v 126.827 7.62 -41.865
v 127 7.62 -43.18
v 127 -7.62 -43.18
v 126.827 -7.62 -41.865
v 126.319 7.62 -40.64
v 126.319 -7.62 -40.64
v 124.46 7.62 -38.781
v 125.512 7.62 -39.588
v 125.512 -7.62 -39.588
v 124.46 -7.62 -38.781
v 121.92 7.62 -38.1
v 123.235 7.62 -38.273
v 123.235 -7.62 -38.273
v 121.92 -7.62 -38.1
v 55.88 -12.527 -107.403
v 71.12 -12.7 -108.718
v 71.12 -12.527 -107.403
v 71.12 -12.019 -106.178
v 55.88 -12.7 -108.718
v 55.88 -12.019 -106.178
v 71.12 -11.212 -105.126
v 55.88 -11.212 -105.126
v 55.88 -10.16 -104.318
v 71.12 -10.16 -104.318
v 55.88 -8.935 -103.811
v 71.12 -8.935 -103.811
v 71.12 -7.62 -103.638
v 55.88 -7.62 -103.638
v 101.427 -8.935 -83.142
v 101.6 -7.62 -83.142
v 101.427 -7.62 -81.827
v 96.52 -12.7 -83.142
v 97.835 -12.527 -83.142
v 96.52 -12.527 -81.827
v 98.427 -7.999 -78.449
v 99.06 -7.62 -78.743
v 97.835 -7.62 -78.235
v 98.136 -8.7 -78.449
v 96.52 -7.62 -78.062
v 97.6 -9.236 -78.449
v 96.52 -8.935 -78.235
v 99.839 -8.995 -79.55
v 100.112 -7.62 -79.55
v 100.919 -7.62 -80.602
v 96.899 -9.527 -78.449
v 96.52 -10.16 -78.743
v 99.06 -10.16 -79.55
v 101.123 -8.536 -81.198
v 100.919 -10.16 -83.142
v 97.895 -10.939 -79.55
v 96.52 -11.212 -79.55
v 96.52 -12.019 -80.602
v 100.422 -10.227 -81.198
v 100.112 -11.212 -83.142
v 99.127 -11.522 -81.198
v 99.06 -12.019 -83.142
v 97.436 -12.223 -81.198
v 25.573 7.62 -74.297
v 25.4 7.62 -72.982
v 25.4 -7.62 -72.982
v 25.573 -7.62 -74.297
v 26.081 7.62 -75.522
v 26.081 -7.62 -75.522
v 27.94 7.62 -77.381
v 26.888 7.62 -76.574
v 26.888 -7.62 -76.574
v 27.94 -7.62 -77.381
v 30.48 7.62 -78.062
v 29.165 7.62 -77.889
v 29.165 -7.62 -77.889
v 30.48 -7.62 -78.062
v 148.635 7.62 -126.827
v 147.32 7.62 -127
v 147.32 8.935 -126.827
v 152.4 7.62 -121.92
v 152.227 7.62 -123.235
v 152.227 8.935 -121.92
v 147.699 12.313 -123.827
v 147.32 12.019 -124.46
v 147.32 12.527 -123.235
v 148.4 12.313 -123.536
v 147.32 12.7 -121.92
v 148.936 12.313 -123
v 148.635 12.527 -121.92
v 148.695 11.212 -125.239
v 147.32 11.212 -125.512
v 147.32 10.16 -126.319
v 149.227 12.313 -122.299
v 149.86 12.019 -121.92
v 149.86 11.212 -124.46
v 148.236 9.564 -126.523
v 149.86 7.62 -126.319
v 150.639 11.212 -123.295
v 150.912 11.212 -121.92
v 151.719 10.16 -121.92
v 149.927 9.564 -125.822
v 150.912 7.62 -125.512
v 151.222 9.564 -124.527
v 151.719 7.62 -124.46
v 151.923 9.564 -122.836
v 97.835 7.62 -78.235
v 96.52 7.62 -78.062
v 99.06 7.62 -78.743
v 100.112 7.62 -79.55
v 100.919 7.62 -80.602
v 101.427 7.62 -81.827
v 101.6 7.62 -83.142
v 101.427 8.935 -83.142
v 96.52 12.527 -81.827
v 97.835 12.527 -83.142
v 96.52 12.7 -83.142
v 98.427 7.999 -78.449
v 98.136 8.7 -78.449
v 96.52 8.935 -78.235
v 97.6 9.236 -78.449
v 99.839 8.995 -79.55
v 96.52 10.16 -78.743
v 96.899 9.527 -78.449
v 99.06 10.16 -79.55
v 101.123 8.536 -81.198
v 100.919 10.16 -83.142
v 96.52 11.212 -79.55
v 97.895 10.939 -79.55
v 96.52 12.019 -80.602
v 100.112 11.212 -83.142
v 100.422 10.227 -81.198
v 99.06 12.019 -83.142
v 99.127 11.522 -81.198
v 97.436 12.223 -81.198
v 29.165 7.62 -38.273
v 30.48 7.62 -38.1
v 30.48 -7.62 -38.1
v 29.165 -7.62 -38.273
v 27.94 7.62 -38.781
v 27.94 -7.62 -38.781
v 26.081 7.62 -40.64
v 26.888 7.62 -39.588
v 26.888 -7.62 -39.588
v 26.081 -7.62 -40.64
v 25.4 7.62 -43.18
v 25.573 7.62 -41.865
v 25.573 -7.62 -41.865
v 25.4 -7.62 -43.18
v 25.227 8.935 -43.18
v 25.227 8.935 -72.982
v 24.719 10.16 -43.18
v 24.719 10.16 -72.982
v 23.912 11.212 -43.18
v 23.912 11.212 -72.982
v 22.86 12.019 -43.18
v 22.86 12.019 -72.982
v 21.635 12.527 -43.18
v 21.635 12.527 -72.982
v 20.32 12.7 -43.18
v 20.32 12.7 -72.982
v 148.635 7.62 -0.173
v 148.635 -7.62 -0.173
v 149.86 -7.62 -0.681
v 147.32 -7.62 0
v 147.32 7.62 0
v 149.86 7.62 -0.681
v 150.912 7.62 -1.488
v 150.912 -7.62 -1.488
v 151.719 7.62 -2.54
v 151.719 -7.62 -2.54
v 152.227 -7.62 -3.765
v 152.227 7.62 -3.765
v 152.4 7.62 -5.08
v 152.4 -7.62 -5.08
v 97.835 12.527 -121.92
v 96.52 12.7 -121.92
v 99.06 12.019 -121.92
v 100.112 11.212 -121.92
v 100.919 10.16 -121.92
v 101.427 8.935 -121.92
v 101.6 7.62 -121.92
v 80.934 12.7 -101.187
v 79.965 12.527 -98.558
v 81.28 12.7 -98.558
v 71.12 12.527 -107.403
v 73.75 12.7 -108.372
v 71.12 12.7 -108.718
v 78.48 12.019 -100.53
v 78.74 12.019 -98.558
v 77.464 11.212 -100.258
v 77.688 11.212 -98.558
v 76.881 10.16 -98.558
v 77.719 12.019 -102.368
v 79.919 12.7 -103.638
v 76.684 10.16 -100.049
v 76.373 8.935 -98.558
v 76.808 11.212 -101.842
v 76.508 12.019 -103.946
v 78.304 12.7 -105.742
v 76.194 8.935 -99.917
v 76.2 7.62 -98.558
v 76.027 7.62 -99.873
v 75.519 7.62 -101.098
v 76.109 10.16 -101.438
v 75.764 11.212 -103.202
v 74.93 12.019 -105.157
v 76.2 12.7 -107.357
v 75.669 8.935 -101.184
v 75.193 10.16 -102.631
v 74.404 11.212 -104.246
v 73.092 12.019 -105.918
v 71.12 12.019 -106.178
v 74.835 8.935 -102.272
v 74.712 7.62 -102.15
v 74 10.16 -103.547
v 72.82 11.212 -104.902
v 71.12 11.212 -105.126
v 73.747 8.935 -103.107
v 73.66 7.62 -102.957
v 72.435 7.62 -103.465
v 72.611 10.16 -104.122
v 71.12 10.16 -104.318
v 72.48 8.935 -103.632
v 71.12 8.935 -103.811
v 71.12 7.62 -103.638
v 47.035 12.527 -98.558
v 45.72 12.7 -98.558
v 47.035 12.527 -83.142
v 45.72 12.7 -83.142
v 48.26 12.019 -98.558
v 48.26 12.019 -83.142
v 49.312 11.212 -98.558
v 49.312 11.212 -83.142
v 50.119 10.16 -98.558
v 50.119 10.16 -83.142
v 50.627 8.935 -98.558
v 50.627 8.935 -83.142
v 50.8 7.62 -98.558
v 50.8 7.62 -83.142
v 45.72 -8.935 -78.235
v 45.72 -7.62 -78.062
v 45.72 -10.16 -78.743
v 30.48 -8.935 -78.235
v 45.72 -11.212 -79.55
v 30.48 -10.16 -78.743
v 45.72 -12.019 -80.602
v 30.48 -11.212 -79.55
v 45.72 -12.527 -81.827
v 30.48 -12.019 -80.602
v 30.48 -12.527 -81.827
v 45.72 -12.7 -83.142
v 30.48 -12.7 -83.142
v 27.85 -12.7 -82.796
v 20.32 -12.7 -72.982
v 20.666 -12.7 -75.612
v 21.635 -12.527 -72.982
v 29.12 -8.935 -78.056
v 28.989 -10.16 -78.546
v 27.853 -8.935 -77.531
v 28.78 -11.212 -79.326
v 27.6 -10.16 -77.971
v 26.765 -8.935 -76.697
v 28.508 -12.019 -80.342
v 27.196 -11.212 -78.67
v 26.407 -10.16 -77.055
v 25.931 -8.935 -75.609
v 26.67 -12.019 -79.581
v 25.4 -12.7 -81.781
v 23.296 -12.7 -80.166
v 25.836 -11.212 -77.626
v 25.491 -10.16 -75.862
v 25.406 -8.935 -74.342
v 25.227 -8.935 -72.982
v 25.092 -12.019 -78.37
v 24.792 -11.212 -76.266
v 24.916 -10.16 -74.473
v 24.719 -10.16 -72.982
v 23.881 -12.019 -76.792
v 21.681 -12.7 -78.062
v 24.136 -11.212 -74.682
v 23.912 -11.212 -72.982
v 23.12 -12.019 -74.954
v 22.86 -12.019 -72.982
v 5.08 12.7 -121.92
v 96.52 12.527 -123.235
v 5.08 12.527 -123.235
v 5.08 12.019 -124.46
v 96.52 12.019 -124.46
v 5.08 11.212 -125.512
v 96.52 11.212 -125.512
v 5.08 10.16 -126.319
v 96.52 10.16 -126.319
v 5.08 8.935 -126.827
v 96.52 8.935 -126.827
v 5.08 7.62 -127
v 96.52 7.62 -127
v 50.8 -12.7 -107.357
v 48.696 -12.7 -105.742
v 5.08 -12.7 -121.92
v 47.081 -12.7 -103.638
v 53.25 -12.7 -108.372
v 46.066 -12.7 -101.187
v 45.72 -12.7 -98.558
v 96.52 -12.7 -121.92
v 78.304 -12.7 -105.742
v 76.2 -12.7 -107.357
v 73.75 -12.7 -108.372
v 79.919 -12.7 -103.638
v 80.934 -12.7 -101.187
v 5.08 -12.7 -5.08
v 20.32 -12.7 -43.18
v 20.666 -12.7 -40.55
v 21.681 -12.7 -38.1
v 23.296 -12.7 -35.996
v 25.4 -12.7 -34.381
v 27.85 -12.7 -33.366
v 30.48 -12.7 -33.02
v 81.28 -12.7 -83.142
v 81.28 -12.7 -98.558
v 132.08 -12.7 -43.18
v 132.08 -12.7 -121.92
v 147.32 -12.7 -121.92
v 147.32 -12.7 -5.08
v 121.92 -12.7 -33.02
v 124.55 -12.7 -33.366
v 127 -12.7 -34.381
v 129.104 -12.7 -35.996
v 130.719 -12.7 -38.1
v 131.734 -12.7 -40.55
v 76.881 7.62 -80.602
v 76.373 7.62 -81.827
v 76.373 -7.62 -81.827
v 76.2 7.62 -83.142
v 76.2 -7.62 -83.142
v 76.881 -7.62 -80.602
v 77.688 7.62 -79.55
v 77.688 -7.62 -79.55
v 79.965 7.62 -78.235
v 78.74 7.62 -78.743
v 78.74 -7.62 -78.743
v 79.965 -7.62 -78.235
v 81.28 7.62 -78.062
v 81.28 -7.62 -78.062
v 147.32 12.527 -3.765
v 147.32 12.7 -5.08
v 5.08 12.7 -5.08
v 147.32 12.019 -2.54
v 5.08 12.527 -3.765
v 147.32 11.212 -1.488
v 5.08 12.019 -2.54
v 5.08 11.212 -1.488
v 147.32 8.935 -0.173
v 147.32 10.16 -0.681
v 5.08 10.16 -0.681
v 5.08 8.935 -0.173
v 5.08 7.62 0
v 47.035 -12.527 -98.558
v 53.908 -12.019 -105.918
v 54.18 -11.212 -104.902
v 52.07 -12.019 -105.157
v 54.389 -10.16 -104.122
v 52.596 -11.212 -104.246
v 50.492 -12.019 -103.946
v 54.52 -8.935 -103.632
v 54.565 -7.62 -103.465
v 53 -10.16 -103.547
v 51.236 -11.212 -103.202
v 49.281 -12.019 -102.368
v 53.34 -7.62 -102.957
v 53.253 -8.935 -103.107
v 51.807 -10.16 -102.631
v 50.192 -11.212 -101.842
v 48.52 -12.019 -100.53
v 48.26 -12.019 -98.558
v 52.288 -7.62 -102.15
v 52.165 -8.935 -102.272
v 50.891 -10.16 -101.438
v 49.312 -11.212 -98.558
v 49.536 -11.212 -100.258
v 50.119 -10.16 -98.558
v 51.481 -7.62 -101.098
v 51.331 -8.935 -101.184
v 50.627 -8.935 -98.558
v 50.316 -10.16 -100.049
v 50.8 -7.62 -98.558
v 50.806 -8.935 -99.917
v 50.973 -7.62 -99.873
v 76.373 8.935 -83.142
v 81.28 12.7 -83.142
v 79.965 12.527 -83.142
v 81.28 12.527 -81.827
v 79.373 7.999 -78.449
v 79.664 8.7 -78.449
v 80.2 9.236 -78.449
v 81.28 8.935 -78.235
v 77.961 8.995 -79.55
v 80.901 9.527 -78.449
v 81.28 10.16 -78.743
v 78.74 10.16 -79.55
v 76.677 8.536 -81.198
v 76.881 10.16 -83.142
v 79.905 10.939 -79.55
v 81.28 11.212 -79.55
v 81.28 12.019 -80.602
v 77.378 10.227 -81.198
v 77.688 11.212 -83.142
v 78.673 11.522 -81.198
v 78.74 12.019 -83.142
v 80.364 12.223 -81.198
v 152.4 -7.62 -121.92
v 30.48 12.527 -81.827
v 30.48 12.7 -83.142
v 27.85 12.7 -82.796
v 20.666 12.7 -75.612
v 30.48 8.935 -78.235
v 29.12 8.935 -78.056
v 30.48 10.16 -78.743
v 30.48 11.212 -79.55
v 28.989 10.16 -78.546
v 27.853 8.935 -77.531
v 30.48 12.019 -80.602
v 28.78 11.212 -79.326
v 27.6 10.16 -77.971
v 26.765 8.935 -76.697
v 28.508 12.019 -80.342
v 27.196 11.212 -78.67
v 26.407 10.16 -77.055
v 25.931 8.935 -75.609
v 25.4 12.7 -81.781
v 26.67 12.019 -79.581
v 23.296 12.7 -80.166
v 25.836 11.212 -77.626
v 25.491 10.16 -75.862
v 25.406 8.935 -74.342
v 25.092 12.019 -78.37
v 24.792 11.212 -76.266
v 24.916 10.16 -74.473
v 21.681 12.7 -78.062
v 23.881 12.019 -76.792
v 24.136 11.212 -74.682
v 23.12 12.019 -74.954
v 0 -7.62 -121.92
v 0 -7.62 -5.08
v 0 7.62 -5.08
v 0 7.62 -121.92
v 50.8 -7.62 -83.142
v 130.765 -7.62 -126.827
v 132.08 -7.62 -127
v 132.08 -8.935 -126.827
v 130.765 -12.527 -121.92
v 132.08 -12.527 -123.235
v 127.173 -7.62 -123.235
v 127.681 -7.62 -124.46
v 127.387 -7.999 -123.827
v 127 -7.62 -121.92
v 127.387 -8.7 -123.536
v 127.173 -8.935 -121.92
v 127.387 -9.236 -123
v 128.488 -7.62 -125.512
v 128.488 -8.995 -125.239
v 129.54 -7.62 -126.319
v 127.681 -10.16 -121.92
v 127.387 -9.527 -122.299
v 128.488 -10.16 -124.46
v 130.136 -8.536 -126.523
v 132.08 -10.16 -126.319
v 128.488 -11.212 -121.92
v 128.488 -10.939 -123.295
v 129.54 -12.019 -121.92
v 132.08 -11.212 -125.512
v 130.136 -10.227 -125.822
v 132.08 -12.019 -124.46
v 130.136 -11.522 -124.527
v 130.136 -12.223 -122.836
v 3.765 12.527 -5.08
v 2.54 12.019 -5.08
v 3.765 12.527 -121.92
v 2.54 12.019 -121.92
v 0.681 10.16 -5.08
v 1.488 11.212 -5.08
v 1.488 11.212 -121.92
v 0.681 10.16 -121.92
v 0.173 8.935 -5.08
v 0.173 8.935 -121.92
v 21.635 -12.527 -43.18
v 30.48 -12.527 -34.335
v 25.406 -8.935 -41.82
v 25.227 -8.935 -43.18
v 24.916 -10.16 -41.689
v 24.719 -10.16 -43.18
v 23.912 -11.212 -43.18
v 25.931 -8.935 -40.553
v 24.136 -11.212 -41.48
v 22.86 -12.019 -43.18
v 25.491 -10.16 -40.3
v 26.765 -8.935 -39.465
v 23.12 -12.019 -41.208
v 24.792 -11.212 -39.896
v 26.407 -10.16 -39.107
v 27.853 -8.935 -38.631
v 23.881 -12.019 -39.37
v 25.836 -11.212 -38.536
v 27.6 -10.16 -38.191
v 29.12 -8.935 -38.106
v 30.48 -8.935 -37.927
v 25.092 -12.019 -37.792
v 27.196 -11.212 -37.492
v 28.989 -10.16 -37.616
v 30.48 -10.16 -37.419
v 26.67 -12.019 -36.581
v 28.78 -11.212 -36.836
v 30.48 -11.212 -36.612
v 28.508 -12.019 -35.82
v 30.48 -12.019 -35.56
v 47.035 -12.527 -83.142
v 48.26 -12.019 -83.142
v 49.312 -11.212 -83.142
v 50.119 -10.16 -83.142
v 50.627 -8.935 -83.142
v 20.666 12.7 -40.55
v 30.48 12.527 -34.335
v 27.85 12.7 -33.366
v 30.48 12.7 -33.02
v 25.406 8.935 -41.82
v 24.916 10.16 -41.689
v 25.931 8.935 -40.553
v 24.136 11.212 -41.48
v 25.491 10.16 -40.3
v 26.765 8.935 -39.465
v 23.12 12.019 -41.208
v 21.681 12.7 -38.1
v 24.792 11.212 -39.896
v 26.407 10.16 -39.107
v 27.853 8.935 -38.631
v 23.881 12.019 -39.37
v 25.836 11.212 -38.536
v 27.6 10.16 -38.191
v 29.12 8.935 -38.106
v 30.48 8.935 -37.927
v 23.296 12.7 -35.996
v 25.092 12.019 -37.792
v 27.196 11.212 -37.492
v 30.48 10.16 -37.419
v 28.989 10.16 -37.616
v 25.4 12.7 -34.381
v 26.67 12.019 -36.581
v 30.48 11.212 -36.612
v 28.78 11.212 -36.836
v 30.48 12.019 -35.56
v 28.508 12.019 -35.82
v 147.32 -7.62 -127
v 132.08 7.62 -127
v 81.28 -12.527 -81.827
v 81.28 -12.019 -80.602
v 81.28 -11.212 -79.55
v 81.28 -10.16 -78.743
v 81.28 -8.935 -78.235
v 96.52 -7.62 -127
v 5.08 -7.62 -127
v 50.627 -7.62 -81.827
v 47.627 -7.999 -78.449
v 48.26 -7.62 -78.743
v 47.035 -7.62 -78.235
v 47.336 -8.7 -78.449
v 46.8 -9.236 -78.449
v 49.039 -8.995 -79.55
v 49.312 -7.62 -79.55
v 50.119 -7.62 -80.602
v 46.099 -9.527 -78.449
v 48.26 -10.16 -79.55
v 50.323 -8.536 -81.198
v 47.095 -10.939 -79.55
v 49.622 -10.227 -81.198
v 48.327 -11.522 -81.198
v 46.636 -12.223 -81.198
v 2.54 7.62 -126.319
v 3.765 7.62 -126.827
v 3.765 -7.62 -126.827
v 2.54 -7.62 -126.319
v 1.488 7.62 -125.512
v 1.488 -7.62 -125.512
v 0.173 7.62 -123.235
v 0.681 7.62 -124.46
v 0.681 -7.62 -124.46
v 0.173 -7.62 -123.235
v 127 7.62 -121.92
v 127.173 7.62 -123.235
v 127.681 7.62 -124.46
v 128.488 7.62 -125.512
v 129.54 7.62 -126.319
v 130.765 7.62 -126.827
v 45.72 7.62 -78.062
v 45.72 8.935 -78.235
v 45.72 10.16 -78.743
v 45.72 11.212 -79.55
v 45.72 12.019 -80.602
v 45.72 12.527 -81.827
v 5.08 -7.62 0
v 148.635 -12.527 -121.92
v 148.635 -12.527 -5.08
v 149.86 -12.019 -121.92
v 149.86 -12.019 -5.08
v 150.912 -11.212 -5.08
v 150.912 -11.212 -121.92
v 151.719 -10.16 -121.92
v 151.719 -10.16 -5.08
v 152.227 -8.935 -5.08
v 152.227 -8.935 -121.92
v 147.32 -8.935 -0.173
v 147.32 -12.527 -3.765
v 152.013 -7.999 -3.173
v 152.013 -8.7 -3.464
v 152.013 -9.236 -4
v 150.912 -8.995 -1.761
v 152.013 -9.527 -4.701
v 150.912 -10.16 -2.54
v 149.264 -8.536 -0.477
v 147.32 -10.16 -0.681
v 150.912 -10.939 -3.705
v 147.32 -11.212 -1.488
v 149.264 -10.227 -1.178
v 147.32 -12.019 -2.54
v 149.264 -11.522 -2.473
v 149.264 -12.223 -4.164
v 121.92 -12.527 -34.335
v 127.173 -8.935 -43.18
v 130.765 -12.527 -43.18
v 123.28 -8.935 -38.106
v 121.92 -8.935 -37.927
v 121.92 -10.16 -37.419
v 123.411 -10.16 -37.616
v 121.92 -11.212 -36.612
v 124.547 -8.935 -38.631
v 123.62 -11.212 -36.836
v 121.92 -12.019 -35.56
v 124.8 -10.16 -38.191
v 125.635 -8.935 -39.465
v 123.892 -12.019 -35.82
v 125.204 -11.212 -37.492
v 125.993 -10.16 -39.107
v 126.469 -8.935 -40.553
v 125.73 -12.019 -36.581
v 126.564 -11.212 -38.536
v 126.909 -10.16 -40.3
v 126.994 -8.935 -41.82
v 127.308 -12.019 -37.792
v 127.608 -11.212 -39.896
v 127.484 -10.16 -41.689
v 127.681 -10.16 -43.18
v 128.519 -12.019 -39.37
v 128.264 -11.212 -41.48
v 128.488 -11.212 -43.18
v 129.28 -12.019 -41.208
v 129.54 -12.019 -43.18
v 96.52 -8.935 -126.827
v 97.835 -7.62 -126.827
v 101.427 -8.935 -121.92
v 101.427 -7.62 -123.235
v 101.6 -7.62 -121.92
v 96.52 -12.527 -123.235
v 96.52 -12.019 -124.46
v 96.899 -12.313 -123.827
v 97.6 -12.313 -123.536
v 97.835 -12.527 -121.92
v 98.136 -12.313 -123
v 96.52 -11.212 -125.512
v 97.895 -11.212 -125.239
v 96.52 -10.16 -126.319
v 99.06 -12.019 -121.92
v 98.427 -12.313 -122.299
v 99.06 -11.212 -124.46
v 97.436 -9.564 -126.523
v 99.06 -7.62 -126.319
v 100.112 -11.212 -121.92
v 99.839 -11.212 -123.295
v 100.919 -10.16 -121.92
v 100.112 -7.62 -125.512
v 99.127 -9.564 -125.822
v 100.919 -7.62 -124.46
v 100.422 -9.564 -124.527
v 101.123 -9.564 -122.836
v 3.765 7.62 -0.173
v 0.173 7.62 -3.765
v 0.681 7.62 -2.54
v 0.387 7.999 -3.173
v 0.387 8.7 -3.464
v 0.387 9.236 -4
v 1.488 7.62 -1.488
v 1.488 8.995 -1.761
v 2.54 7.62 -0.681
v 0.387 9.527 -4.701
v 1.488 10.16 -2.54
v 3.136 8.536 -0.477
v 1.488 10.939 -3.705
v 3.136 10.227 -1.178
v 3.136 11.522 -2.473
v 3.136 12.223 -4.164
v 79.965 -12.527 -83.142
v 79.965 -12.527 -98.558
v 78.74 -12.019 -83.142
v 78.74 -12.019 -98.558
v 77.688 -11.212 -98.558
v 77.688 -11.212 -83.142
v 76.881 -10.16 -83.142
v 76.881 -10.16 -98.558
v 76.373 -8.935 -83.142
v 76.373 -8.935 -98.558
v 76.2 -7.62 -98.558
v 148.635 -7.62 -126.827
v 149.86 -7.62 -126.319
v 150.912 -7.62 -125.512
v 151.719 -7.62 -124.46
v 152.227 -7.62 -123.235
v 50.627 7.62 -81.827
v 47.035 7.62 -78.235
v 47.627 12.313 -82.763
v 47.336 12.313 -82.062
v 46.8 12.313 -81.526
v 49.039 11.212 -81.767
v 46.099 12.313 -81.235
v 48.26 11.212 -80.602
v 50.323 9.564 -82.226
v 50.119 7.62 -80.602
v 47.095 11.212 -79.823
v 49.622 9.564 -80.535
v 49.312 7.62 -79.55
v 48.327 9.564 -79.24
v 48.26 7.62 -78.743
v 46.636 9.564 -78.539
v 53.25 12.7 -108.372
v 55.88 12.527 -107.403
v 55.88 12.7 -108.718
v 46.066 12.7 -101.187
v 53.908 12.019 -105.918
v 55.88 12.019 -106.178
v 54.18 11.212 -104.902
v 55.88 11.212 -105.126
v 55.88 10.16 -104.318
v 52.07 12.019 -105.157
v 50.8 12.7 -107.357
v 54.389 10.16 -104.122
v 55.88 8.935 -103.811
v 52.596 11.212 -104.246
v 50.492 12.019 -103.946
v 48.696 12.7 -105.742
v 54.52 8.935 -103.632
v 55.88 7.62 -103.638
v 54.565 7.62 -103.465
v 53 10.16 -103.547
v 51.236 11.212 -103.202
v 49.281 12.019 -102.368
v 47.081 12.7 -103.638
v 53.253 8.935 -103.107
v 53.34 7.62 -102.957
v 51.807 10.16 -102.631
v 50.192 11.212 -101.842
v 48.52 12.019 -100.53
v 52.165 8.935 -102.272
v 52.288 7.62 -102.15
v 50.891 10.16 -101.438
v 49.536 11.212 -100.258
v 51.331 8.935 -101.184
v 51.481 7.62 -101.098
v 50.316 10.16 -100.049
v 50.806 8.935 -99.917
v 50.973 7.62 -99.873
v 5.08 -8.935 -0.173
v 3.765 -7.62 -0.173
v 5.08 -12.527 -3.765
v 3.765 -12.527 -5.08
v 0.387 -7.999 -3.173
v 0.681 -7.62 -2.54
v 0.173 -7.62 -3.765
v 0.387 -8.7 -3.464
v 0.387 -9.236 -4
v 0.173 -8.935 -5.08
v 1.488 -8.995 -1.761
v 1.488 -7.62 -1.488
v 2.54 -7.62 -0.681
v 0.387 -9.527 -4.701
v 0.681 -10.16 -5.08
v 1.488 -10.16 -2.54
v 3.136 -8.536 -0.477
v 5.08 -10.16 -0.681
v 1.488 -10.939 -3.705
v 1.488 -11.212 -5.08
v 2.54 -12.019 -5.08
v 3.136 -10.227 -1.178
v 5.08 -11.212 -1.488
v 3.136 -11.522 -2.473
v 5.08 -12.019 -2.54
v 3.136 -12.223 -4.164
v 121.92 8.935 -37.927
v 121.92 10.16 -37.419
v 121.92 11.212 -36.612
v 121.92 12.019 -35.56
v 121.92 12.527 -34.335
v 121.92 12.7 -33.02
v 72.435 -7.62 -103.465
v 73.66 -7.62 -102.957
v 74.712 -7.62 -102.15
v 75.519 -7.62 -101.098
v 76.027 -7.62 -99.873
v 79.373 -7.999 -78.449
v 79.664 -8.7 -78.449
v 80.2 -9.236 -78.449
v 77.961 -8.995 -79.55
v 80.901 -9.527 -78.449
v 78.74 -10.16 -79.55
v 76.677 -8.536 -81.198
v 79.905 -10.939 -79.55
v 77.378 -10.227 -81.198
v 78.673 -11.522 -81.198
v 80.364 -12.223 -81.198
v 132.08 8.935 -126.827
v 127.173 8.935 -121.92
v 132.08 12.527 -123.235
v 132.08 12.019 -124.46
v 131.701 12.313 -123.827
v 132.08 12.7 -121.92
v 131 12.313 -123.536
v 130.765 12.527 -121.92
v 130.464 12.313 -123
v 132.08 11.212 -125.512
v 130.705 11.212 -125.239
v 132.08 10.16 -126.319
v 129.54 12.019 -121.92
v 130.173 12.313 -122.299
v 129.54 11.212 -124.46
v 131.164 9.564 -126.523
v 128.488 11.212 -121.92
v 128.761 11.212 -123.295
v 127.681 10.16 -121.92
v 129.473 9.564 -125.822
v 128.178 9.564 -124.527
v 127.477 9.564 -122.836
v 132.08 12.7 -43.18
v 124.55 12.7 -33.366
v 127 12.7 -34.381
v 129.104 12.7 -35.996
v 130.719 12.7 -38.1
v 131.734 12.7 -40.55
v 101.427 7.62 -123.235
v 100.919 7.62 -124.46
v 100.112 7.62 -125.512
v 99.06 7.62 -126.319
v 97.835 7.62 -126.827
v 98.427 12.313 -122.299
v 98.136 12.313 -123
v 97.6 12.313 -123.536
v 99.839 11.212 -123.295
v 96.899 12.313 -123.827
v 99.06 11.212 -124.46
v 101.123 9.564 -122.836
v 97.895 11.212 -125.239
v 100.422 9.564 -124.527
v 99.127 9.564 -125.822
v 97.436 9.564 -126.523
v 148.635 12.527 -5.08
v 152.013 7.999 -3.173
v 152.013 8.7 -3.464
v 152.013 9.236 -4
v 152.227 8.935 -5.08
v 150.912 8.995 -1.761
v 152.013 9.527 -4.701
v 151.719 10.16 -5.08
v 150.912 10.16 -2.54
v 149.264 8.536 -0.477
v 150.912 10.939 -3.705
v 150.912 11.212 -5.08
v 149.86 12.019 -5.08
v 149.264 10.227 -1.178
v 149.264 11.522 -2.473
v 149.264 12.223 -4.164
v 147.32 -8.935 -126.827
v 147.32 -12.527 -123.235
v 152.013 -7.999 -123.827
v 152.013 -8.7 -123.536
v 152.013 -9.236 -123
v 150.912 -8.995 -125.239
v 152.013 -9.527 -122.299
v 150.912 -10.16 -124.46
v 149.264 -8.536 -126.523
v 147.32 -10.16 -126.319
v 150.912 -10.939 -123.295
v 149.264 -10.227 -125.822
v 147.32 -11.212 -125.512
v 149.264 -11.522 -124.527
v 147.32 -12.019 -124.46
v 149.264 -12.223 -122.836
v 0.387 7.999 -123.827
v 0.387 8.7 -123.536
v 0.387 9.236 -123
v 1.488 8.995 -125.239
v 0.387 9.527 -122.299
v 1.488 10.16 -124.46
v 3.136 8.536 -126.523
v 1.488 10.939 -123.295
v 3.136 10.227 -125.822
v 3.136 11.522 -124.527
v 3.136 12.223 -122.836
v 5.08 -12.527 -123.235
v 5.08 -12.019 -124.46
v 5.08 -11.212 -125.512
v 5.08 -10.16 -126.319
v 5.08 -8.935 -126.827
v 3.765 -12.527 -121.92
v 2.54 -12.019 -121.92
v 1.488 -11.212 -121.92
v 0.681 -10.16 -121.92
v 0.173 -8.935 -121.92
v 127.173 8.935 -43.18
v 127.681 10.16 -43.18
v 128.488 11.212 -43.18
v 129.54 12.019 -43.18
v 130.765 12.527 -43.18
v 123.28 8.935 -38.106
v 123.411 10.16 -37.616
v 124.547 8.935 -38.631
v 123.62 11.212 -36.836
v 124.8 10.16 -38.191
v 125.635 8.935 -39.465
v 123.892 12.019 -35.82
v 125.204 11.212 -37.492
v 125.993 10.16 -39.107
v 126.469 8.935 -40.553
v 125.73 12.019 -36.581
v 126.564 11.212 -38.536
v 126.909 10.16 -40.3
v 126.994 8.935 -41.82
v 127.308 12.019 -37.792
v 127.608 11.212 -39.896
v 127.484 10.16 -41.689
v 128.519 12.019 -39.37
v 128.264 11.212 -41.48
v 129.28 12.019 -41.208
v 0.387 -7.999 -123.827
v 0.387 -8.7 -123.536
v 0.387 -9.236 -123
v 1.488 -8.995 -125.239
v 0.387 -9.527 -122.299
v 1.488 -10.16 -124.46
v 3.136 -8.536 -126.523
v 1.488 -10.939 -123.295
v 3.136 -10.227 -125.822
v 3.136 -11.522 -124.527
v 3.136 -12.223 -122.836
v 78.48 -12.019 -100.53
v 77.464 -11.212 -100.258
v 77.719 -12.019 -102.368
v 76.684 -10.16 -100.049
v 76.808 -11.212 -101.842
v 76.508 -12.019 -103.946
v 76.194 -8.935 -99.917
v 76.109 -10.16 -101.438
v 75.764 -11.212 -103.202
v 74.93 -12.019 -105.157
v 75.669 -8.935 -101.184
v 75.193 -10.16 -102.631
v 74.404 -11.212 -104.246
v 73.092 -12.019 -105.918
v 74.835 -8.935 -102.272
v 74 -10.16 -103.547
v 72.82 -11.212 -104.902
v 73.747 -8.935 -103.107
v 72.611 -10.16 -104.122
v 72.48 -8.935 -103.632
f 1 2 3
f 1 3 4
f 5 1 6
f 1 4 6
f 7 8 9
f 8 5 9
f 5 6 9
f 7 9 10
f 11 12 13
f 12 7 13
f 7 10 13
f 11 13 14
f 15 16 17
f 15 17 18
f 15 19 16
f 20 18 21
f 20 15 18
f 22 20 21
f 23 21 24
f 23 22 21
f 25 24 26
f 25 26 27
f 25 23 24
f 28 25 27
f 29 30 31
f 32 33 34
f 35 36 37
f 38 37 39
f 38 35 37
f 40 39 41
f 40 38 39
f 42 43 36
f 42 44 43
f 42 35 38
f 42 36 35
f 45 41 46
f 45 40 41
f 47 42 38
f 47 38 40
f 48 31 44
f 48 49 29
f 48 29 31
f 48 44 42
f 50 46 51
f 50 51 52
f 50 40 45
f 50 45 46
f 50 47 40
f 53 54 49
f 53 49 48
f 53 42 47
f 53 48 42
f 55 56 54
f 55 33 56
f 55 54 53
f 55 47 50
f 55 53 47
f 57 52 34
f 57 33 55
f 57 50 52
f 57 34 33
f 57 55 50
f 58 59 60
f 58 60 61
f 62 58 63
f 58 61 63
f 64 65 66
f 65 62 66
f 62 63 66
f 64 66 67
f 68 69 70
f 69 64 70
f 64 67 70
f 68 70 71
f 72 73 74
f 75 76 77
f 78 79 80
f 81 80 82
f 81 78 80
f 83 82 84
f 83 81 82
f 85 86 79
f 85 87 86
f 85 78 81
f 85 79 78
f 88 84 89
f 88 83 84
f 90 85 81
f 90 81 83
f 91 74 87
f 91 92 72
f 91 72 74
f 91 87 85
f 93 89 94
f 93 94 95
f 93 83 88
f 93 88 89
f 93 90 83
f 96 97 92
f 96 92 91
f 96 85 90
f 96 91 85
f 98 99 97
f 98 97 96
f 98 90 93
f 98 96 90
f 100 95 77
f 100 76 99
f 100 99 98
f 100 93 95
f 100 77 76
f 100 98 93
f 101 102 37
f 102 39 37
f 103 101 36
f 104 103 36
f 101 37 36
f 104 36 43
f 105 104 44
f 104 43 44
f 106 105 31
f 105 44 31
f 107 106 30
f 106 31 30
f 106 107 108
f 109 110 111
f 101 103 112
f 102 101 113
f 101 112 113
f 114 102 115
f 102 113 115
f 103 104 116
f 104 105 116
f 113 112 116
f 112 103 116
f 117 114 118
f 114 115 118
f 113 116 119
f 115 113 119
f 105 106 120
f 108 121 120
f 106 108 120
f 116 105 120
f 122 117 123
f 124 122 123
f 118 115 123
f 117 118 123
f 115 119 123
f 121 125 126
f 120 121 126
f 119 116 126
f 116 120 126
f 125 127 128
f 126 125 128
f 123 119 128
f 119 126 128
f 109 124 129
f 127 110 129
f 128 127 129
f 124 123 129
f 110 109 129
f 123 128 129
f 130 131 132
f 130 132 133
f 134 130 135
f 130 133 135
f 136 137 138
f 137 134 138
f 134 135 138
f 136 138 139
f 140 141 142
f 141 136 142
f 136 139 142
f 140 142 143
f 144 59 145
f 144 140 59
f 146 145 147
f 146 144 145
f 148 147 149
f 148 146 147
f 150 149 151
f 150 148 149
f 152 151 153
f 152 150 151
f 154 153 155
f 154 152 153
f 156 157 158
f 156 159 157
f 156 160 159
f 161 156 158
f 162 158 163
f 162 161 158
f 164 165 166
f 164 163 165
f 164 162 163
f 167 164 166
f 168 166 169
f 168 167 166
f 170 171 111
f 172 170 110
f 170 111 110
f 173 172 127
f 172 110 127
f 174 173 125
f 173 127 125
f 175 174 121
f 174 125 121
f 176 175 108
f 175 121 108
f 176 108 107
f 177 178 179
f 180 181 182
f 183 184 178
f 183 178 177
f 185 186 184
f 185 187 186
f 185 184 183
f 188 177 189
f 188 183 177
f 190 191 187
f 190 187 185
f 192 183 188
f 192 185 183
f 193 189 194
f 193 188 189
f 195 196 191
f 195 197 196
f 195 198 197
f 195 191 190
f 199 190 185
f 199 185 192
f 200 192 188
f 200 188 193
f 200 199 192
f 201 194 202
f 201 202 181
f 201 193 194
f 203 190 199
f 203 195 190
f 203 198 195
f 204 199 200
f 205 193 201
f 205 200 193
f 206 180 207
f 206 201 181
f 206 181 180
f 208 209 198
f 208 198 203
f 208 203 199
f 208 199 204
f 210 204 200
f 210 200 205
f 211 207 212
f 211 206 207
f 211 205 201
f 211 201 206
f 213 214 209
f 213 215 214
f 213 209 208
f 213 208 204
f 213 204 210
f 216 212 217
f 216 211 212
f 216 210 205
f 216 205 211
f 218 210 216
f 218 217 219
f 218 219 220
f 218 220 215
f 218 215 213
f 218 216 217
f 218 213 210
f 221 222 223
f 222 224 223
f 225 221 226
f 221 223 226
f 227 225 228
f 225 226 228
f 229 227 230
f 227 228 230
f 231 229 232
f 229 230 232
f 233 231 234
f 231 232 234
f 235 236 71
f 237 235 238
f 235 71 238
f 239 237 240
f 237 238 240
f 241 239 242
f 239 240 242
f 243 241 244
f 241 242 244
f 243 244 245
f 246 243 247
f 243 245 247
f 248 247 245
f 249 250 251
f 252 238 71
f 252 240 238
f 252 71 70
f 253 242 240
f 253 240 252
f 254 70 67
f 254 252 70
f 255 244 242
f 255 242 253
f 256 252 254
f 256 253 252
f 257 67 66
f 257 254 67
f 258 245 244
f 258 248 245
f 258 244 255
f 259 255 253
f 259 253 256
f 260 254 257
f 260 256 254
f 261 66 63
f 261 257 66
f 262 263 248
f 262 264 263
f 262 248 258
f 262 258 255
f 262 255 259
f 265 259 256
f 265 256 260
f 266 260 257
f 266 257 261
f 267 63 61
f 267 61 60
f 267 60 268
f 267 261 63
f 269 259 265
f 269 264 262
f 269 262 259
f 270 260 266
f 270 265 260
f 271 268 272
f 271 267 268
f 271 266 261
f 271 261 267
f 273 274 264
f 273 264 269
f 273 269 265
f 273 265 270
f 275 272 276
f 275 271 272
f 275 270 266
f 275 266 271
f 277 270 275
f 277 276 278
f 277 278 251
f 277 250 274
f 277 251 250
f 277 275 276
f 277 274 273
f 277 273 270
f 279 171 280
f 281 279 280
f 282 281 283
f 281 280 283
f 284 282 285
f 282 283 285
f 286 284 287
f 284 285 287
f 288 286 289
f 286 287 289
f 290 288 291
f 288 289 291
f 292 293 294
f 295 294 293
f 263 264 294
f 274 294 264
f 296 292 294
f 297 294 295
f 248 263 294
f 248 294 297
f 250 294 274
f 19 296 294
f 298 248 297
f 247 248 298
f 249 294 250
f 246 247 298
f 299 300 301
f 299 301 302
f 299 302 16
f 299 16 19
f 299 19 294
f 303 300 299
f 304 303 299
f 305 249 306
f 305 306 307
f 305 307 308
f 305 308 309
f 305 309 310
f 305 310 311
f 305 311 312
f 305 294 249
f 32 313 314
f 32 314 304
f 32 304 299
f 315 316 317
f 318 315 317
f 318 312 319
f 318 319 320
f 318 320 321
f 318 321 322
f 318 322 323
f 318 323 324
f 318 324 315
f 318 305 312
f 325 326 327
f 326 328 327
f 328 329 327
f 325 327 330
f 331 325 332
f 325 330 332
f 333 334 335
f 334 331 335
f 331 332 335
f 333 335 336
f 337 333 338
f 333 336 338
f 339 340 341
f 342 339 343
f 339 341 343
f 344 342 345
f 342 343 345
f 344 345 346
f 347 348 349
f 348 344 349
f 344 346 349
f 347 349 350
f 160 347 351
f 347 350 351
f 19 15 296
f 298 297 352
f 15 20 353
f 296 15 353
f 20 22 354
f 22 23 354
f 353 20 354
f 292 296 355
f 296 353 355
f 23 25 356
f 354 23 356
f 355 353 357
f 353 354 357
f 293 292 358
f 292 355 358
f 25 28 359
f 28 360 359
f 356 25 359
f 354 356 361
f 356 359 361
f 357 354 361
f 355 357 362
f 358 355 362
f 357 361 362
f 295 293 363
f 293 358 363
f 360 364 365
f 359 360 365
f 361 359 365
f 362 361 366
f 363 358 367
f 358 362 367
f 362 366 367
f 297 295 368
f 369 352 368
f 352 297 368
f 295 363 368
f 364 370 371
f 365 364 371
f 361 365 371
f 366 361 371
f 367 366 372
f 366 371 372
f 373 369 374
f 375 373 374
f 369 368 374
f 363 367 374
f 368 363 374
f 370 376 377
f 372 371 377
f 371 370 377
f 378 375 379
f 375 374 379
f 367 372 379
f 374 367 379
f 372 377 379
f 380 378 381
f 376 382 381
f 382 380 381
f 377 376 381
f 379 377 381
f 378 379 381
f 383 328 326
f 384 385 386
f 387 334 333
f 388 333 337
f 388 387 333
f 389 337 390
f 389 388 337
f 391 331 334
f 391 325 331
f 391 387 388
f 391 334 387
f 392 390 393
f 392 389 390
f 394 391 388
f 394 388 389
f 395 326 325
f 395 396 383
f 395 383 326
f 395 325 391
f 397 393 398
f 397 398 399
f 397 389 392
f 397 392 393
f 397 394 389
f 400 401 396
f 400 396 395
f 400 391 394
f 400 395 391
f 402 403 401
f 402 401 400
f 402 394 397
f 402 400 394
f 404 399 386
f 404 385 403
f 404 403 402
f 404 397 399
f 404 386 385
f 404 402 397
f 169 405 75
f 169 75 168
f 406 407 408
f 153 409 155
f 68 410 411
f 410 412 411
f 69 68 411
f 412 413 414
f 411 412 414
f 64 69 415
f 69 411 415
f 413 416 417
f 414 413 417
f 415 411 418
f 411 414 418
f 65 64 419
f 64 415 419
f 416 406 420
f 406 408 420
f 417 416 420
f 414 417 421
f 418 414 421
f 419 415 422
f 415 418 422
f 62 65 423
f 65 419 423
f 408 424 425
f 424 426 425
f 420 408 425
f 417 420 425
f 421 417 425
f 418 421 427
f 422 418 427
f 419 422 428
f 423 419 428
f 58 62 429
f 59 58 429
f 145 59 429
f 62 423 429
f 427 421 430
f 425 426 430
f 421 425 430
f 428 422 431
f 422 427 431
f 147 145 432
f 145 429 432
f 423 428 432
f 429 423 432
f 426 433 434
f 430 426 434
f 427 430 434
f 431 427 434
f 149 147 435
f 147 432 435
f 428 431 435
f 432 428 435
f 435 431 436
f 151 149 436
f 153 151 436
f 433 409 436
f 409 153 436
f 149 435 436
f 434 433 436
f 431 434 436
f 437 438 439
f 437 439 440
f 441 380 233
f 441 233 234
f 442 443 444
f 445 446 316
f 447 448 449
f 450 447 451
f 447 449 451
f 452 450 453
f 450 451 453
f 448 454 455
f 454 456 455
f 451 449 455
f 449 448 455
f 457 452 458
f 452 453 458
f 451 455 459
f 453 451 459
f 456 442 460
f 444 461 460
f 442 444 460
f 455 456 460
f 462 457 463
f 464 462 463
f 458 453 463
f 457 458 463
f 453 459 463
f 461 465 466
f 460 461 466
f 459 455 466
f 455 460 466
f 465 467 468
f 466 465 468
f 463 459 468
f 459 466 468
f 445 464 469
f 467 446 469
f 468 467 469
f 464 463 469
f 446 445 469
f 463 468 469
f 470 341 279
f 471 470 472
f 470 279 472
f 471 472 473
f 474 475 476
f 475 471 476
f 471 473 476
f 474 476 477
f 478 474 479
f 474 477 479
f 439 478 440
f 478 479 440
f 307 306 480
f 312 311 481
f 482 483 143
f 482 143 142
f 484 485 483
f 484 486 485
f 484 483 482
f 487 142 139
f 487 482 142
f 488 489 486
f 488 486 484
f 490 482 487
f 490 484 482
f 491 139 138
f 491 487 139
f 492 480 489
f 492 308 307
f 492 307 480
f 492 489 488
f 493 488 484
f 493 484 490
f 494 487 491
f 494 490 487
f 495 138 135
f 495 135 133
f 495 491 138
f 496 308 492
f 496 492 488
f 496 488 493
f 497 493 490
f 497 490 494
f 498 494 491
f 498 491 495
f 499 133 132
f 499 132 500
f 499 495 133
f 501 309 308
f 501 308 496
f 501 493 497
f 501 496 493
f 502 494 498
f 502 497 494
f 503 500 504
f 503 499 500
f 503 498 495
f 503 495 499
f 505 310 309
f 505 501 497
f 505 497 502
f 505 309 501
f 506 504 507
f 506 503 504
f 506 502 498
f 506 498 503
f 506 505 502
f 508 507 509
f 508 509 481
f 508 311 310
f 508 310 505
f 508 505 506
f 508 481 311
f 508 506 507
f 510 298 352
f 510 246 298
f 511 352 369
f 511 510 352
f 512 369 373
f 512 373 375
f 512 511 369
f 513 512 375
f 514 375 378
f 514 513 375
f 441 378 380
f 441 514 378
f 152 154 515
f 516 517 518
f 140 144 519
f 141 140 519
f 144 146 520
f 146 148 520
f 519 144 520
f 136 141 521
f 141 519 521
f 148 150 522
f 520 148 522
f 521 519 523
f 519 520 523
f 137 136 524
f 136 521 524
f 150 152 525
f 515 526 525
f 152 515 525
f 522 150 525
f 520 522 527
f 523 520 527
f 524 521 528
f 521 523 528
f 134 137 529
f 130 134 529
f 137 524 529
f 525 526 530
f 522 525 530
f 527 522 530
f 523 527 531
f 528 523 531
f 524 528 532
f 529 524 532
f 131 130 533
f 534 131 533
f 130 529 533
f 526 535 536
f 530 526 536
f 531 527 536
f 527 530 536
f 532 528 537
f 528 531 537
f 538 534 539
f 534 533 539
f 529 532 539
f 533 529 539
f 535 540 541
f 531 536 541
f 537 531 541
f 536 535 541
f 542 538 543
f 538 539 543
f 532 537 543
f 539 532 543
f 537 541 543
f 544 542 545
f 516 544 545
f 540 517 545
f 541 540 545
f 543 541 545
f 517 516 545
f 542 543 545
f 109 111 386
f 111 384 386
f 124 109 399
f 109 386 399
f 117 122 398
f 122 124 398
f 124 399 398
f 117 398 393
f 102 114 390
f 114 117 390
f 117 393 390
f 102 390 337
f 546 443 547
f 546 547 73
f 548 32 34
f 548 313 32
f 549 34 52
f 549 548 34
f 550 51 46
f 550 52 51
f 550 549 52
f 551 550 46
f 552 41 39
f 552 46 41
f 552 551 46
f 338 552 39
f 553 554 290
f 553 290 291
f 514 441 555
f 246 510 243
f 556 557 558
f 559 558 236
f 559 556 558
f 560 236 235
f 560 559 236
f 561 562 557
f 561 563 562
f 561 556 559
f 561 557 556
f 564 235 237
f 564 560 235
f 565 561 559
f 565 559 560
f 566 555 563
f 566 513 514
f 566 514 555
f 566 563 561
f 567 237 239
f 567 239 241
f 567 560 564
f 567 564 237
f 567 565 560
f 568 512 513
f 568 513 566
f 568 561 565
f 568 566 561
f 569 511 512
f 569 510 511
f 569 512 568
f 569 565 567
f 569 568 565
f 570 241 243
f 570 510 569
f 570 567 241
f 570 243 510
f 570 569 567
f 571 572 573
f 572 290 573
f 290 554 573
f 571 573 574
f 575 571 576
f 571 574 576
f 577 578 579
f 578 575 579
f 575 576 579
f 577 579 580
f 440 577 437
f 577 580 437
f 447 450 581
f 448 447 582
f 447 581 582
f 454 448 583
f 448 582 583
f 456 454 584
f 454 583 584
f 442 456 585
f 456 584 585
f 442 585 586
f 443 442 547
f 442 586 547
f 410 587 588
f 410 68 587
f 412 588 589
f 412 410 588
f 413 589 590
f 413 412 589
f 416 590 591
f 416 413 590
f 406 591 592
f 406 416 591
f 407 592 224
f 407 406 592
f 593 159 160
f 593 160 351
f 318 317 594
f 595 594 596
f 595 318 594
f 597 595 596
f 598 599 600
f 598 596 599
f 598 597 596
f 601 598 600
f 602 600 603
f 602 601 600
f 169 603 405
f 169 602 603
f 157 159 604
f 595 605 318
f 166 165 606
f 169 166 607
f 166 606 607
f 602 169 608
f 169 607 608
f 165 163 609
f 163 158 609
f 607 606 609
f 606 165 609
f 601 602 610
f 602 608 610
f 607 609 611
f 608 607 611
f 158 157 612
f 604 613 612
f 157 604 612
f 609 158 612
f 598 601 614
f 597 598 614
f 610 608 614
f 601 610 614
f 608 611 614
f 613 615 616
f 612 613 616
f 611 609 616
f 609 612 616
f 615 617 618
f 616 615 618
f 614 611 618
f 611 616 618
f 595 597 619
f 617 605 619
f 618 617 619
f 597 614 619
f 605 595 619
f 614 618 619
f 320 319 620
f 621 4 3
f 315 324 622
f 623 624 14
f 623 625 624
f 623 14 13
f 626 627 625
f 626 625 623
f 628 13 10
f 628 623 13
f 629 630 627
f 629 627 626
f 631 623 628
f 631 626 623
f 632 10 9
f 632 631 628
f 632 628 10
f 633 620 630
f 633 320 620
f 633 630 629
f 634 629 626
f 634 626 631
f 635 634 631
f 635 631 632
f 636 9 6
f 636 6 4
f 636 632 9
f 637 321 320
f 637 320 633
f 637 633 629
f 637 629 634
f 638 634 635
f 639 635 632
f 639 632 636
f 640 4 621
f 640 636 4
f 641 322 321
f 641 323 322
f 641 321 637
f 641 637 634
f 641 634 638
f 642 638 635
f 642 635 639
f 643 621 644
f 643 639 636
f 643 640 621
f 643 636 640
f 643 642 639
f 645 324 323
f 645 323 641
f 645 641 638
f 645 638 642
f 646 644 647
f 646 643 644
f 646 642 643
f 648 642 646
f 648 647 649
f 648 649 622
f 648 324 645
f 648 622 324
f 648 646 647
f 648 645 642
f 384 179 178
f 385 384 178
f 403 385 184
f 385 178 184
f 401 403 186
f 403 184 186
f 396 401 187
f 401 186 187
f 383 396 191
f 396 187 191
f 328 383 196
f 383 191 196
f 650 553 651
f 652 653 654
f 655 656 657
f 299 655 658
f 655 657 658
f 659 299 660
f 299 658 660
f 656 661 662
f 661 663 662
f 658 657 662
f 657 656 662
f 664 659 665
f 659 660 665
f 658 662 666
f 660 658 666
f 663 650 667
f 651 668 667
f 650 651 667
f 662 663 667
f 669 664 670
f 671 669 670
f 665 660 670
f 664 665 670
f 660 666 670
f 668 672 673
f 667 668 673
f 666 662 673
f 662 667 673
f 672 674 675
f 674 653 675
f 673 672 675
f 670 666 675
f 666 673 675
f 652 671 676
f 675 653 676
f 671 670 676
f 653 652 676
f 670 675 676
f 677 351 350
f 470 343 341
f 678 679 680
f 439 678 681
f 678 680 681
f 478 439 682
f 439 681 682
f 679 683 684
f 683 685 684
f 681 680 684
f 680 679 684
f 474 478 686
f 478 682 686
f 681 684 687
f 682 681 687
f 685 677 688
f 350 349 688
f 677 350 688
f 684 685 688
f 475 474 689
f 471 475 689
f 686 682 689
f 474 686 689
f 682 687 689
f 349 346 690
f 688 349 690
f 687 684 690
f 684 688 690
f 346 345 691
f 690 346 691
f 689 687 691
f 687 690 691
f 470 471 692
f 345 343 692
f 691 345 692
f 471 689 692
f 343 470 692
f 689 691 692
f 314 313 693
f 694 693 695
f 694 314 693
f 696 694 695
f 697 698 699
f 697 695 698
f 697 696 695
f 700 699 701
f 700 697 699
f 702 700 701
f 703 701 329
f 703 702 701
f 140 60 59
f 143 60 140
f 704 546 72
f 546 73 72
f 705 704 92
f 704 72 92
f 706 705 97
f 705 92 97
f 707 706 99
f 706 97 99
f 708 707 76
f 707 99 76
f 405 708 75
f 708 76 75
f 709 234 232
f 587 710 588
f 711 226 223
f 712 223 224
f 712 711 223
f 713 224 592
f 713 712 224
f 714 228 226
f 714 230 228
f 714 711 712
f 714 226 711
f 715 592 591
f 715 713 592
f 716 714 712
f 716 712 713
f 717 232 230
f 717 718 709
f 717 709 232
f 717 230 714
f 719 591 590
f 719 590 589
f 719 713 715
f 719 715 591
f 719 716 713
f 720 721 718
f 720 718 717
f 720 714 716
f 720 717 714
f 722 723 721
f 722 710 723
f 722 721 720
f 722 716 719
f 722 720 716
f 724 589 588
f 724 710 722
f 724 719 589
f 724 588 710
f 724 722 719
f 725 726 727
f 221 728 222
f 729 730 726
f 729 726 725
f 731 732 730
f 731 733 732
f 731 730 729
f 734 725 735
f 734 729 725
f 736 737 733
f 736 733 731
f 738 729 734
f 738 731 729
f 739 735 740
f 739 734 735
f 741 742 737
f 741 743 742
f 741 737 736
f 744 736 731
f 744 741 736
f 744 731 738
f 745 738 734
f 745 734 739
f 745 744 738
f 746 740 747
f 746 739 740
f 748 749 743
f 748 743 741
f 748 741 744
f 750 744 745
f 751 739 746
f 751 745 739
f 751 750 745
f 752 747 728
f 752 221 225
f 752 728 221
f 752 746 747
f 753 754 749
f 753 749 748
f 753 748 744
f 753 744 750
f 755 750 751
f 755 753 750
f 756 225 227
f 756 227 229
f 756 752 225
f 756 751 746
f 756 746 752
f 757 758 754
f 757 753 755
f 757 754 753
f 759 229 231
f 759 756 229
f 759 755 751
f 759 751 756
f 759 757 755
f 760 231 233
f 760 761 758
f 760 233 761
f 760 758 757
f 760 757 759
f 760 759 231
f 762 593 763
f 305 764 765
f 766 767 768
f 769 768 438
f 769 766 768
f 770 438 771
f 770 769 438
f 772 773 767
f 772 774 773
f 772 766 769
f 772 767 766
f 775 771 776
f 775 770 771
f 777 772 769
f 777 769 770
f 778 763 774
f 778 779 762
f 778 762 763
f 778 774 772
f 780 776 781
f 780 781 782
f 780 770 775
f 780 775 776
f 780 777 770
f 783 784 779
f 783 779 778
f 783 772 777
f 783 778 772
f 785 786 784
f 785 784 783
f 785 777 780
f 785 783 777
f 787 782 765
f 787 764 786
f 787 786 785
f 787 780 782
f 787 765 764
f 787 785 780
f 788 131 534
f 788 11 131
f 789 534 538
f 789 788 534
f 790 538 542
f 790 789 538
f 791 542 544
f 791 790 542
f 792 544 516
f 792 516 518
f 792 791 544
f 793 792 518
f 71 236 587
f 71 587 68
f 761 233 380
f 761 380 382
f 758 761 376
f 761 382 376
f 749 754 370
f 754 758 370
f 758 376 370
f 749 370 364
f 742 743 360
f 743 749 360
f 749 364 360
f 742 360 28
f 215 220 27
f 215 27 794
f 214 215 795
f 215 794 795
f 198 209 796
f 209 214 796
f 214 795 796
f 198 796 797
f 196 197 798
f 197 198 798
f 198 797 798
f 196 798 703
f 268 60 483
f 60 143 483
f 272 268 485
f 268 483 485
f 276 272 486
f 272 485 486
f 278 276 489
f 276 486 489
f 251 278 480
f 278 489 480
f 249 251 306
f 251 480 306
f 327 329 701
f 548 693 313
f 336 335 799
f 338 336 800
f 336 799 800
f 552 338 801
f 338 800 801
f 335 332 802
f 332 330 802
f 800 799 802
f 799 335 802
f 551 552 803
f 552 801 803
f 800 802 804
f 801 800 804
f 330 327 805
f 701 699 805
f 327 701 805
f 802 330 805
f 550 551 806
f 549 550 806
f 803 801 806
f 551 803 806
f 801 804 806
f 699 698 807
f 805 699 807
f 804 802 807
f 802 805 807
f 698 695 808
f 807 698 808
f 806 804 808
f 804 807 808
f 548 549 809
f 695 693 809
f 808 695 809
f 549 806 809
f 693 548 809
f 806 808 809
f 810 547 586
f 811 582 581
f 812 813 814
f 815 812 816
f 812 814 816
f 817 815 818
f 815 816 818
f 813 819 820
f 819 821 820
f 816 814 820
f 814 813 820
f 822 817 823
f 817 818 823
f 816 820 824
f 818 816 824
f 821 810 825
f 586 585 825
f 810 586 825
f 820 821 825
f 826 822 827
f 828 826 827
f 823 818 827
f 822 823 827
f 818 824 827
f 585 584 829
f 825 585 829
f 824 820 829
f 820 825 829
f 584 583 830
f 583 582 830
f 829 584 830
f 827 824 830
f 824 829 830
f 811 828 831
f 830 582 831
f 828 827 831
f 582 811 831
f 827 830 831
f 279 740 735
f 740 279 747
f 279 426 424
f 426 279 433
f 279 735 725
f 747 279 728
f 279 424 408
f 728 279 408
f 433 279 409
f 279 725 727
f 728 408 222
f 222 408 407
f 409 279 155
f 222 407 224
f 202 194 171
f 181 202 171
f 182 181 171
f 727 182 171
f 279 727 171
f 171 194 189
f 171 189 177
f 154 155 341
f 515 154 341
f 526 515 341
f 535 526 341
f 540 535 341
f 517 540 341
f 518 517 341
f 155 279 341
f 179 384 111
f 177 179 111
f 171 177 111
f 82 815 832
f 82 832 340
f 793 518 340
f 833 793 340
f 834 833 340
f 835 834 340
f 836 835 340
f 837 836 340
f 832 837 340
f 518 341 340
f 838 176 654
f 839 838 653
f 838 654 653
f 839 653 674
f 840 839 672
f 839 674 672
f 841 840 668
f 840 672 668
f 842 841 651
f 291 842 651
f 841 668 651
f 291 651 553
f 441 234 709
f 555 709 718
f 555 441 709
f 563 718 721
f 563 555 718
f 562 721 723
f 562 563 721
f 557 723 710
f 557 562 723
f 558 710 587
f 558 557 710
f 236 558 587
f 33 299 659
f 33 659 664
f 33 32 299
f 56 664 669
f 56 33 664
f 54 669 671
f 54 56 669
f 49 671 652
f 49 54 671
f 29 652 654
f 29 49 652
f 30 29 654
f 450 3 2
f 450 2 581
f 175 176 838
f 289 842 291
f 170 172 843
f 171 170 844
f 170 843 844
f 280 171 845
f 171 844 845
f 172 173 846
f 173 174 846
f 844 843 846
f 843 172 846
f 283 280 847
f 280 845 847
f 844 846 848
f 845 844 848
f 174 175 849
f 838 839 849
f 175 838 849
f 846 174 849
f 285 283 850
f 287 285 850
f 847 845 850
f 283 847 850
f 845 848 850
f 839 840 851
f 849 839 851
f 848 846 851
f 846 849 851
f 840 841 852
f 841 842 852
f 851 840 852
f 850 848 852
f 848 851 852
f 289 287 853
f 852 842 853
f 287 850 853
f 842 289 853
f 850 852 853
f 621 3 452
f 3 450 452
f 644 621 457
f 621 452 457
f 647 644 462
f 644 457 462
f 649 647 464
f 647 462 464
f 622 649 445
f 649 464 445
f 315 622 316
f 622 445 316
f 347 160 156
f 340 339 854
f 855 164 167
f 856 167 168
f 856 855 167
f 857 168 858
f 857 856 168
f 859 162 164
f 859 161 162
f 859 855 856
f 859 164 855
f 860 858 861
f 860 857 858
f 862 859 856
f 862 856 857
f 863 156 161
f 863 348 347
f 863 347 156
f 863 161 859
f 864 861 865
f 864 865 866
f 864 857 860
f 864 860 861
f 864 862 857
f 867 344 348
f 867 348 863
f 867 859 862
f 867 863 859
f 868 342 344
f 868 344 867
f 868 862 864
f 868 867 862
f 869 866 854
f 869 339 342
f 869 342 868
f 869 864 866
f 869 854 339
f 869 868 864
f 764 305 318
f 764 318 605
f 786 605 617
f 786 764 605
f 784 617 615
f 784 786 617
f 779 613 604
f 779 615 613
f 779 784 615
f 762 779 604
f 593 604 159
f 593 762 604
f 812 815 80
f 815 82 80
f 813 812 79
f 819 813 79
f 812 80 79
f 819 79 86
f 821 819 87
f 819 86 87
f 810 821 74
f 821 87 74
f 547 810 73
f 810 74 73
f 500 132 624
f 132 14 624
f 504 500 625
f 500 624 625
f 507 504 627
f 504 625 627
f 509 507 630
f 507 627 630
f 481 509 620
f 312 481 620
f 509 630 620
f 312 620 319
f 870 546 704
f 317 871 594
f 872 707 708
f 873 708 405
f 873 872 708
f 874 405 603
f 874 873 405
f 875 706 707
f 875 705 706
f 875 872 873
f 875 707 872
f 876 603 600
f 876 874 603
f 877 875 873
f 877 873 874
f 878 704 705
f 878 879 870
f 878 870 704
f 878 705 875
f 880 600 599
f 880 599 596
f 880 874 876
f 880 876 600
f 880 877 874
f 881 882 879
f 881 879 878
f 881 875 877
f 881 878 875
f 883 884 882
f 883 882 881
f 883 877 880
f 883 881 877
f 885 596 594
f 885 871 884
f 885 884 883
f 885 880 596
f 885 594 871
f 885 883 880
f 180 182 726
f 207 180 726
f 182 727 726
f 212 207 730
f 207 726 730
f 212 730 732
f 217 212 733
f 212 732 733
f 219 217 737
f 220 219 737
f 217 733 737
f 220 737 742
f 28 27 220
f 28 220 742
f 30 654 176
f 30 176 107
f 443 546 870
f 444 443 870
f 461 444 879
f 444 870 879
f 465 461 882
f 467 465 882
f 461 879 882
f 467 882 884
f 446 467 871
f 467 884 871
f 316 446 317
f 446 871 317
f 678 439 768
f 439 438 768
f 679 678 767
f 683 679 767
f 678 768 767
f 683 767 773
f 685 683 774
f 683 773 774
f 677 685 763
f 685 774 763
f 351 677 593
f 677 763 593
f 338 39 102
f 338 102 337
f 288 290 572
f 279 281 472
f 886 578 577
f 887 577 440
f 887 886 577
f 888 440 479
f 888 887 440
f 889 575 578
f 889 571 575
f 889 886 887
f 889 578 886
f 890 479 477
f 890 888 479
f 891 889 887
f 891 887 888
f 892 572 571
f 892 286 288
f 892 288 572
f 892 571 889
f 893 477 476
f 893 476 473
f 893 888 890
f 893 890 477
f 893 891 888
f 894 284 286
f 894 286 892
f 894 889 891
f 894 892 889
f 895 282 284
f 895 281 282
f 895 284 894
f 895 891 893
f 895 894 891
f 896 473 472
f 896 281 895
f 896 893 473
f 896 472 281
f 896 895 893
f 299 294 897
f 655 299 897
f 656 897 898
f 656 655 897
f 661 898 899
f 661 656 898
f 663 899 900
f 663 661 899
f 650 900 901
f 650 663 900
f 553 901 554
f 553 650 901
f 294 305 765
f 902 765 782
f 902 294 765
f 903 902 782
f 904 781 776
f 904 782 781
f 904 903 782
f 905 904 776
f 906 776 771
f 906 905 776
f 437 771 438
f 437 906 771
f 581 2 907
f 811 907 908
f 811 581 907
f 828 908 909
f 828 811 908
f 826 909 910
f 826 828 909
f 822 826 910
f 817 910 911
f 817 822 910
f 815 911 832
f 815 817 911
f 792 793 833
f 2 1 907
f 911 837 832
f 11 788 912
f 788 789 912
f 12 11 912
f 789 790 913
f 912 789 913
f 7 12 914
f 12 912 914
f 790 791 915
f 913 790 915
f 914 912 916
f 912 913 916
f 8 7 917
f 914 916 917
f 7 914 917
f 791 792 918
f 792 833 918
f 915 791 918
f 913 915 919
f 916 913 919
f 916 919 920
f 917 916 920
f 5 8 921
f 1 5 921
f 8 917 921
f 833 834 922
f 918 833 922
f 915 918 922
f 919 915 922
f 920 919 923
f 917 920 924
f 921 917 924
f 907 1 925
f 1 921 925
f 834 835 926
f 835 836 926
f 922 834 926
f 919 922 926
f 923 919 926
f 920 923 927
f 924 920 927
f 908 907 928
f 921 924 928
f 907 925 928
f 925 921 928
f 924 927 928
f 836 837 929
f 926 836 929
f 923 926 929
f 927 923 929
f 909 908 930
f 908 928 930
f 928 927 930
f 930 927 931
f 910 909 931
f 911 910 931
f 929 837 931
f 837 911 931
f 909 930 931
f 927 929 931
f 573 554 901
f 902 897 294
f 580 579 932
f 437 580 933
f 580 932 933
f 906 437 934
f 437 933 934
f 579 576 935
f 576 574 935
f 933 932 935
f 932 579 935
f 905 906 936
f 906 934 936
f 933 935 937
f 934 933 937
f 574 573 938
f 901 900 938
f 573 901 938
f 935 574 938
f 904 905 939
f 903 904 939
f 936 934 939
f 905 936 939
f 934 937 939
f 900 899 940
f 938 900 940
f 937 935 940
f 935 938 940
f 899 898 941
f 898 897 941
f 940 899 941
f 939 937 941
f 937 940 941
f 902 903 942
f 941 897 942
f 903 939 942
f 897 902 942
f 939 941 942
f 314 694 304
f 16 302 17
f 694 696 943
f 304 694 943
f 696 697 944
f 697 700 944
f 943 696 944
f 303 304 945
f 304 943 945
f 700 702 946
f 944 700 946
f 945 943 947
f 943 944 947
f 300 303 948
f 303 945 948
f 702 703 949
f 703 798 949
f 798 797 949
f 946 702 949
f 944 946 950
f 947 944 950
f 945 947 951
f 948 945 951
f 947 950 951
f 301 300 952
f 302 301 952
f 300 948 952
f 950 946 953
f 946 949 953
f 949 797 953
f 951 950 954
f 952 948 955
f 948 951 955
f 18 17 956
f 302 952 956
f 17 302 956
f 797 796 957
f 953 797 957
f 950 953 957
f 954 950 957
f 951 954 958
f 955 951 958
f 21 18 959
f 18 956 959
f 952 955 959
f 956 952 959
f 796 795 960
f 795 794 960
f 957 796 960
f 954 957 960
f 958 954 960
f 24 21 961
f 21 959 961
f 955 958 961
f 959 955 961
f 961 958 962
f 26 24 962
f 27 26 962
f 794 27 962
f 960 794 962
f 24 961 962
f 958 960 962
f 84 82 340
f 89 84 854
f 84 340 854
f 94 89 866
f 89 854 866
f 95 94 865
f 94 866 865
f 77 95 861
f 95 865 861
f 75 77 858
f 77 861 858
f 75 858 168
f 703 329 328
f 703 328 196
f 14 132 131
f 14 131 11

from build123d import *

# Parameters (mm, degrees)
F1_DEPTH = 12.7
F2_F1_R  = 5.08
F2_F2_R  = 5.08


with BuildPart() as f1:
    # F0 (on Front) → F1 (new body, symmetric)
    with BuildSketch(Plane.XZ):
        Polygon((152.4, 0), (0, 0), (0, -127), (101.6, -127), (101.6, -78.0620644748), (76.2, -78.0620644748), (76.2, -103.637776798), (50.8, -103.637776798), (50.8, -78.0620644748), (25.4, -78.0620644748), (25.4, -38.1), (127, -38.1), (127, -127), (152.4, -127), align=None)
    extrude(amount=F1_DEPTH, both=True)

    # F2: fillet of radius 5.08 on 40 edges, made by hand

    # F2_f1
    f2_f1_edges = [f1.edges().sort_by_distance(p)[0] for p in [
        (25.4, 0, -78.0620644748),
        (25.4, 0, -38.1),
        (127, 0, -38.1),
        (76.2, 0, -103.637776798),
        (50.8, 0, -103.637776798),
    ]]
    fillet(f2_f1_edges, radius=F2_F1_R)

    # F2_f2
    f2_f2_edges = [f1.edges().sort_by_distance(p)[0] for p in [
        (76.2, -12.7, 0),
        (76.2, 12.7, 0),
        (152.4, 0, 0),
        (0, 0, 0),
        (139.7, -12.7, -127),
        (152.4, 0, -127),
        (127, 0, -127),
        (139.7, 12.7, -127),
        (101.6, 0, -127),
        (50.8, -12.7, -127),
        (101.6, -12.7, -102.5310322374),
        (101.6, 12.7, -102.5310322374),
        (101.6, 0, -78.0620644748),
        (50.8, 12.7, -127),
        (0, 0, -127),
        (63.5, -12.7, -103.637776798),
        (76.2, -12.7, -88.3099206364),
        (50.8, -12.7, -88.3099206364),
        (50.8, 0, -78.0620644748),
        (50.8, 12.7, -88.3099206364),
        (63.5, 12.7, -103.637776798),
        (76.2, 0, -78.0620644748),
        (88.9, 12.7, -78.0620644748),
        (127, -12.7, -85.09),
        (127, 12.7, -85.09),
        (76.2, -12.7, -38.1),
        (25.4, -12.7, -58.0810322374),
        (40.64, -12.7, -78.0620644748),
        (0, -12.7, -63.5),
        (88.9, -12.7, -78.0620644748),
        (40.64, 12.7, -78.0620644748),
        (0, 12.7, -63.5),
        (25.4, 12.7, -58.0810322374),
        (152.4, -12.7, -63.5),
        (152.4, 12.7, -63.5),
        (26.8878975516, 12.7, -76.5741669232),
        (26.8878975516, 12.7, -39.5878975516),
        (26.8878975516, -12.7, -76.5741669232),
        (26.8878975516, -12.7, -39.5878975516),
        (125.5121024484, -12.7, -39.5878975516),
        (125.5121024484, 12.7, -39.5878975516),
        (74.7121024484, 12.7, -102.1498792464),
        (52.2878975516, 12.7, -102.1498792464),
        (52.2878975516, -12.7, -102.1498792464),
        (74.7121024484, -12.7, -102.1498792464),
    ]]
    fillet(f2_f2_edges, radius=F2_F2_R)


solid = f1.part
